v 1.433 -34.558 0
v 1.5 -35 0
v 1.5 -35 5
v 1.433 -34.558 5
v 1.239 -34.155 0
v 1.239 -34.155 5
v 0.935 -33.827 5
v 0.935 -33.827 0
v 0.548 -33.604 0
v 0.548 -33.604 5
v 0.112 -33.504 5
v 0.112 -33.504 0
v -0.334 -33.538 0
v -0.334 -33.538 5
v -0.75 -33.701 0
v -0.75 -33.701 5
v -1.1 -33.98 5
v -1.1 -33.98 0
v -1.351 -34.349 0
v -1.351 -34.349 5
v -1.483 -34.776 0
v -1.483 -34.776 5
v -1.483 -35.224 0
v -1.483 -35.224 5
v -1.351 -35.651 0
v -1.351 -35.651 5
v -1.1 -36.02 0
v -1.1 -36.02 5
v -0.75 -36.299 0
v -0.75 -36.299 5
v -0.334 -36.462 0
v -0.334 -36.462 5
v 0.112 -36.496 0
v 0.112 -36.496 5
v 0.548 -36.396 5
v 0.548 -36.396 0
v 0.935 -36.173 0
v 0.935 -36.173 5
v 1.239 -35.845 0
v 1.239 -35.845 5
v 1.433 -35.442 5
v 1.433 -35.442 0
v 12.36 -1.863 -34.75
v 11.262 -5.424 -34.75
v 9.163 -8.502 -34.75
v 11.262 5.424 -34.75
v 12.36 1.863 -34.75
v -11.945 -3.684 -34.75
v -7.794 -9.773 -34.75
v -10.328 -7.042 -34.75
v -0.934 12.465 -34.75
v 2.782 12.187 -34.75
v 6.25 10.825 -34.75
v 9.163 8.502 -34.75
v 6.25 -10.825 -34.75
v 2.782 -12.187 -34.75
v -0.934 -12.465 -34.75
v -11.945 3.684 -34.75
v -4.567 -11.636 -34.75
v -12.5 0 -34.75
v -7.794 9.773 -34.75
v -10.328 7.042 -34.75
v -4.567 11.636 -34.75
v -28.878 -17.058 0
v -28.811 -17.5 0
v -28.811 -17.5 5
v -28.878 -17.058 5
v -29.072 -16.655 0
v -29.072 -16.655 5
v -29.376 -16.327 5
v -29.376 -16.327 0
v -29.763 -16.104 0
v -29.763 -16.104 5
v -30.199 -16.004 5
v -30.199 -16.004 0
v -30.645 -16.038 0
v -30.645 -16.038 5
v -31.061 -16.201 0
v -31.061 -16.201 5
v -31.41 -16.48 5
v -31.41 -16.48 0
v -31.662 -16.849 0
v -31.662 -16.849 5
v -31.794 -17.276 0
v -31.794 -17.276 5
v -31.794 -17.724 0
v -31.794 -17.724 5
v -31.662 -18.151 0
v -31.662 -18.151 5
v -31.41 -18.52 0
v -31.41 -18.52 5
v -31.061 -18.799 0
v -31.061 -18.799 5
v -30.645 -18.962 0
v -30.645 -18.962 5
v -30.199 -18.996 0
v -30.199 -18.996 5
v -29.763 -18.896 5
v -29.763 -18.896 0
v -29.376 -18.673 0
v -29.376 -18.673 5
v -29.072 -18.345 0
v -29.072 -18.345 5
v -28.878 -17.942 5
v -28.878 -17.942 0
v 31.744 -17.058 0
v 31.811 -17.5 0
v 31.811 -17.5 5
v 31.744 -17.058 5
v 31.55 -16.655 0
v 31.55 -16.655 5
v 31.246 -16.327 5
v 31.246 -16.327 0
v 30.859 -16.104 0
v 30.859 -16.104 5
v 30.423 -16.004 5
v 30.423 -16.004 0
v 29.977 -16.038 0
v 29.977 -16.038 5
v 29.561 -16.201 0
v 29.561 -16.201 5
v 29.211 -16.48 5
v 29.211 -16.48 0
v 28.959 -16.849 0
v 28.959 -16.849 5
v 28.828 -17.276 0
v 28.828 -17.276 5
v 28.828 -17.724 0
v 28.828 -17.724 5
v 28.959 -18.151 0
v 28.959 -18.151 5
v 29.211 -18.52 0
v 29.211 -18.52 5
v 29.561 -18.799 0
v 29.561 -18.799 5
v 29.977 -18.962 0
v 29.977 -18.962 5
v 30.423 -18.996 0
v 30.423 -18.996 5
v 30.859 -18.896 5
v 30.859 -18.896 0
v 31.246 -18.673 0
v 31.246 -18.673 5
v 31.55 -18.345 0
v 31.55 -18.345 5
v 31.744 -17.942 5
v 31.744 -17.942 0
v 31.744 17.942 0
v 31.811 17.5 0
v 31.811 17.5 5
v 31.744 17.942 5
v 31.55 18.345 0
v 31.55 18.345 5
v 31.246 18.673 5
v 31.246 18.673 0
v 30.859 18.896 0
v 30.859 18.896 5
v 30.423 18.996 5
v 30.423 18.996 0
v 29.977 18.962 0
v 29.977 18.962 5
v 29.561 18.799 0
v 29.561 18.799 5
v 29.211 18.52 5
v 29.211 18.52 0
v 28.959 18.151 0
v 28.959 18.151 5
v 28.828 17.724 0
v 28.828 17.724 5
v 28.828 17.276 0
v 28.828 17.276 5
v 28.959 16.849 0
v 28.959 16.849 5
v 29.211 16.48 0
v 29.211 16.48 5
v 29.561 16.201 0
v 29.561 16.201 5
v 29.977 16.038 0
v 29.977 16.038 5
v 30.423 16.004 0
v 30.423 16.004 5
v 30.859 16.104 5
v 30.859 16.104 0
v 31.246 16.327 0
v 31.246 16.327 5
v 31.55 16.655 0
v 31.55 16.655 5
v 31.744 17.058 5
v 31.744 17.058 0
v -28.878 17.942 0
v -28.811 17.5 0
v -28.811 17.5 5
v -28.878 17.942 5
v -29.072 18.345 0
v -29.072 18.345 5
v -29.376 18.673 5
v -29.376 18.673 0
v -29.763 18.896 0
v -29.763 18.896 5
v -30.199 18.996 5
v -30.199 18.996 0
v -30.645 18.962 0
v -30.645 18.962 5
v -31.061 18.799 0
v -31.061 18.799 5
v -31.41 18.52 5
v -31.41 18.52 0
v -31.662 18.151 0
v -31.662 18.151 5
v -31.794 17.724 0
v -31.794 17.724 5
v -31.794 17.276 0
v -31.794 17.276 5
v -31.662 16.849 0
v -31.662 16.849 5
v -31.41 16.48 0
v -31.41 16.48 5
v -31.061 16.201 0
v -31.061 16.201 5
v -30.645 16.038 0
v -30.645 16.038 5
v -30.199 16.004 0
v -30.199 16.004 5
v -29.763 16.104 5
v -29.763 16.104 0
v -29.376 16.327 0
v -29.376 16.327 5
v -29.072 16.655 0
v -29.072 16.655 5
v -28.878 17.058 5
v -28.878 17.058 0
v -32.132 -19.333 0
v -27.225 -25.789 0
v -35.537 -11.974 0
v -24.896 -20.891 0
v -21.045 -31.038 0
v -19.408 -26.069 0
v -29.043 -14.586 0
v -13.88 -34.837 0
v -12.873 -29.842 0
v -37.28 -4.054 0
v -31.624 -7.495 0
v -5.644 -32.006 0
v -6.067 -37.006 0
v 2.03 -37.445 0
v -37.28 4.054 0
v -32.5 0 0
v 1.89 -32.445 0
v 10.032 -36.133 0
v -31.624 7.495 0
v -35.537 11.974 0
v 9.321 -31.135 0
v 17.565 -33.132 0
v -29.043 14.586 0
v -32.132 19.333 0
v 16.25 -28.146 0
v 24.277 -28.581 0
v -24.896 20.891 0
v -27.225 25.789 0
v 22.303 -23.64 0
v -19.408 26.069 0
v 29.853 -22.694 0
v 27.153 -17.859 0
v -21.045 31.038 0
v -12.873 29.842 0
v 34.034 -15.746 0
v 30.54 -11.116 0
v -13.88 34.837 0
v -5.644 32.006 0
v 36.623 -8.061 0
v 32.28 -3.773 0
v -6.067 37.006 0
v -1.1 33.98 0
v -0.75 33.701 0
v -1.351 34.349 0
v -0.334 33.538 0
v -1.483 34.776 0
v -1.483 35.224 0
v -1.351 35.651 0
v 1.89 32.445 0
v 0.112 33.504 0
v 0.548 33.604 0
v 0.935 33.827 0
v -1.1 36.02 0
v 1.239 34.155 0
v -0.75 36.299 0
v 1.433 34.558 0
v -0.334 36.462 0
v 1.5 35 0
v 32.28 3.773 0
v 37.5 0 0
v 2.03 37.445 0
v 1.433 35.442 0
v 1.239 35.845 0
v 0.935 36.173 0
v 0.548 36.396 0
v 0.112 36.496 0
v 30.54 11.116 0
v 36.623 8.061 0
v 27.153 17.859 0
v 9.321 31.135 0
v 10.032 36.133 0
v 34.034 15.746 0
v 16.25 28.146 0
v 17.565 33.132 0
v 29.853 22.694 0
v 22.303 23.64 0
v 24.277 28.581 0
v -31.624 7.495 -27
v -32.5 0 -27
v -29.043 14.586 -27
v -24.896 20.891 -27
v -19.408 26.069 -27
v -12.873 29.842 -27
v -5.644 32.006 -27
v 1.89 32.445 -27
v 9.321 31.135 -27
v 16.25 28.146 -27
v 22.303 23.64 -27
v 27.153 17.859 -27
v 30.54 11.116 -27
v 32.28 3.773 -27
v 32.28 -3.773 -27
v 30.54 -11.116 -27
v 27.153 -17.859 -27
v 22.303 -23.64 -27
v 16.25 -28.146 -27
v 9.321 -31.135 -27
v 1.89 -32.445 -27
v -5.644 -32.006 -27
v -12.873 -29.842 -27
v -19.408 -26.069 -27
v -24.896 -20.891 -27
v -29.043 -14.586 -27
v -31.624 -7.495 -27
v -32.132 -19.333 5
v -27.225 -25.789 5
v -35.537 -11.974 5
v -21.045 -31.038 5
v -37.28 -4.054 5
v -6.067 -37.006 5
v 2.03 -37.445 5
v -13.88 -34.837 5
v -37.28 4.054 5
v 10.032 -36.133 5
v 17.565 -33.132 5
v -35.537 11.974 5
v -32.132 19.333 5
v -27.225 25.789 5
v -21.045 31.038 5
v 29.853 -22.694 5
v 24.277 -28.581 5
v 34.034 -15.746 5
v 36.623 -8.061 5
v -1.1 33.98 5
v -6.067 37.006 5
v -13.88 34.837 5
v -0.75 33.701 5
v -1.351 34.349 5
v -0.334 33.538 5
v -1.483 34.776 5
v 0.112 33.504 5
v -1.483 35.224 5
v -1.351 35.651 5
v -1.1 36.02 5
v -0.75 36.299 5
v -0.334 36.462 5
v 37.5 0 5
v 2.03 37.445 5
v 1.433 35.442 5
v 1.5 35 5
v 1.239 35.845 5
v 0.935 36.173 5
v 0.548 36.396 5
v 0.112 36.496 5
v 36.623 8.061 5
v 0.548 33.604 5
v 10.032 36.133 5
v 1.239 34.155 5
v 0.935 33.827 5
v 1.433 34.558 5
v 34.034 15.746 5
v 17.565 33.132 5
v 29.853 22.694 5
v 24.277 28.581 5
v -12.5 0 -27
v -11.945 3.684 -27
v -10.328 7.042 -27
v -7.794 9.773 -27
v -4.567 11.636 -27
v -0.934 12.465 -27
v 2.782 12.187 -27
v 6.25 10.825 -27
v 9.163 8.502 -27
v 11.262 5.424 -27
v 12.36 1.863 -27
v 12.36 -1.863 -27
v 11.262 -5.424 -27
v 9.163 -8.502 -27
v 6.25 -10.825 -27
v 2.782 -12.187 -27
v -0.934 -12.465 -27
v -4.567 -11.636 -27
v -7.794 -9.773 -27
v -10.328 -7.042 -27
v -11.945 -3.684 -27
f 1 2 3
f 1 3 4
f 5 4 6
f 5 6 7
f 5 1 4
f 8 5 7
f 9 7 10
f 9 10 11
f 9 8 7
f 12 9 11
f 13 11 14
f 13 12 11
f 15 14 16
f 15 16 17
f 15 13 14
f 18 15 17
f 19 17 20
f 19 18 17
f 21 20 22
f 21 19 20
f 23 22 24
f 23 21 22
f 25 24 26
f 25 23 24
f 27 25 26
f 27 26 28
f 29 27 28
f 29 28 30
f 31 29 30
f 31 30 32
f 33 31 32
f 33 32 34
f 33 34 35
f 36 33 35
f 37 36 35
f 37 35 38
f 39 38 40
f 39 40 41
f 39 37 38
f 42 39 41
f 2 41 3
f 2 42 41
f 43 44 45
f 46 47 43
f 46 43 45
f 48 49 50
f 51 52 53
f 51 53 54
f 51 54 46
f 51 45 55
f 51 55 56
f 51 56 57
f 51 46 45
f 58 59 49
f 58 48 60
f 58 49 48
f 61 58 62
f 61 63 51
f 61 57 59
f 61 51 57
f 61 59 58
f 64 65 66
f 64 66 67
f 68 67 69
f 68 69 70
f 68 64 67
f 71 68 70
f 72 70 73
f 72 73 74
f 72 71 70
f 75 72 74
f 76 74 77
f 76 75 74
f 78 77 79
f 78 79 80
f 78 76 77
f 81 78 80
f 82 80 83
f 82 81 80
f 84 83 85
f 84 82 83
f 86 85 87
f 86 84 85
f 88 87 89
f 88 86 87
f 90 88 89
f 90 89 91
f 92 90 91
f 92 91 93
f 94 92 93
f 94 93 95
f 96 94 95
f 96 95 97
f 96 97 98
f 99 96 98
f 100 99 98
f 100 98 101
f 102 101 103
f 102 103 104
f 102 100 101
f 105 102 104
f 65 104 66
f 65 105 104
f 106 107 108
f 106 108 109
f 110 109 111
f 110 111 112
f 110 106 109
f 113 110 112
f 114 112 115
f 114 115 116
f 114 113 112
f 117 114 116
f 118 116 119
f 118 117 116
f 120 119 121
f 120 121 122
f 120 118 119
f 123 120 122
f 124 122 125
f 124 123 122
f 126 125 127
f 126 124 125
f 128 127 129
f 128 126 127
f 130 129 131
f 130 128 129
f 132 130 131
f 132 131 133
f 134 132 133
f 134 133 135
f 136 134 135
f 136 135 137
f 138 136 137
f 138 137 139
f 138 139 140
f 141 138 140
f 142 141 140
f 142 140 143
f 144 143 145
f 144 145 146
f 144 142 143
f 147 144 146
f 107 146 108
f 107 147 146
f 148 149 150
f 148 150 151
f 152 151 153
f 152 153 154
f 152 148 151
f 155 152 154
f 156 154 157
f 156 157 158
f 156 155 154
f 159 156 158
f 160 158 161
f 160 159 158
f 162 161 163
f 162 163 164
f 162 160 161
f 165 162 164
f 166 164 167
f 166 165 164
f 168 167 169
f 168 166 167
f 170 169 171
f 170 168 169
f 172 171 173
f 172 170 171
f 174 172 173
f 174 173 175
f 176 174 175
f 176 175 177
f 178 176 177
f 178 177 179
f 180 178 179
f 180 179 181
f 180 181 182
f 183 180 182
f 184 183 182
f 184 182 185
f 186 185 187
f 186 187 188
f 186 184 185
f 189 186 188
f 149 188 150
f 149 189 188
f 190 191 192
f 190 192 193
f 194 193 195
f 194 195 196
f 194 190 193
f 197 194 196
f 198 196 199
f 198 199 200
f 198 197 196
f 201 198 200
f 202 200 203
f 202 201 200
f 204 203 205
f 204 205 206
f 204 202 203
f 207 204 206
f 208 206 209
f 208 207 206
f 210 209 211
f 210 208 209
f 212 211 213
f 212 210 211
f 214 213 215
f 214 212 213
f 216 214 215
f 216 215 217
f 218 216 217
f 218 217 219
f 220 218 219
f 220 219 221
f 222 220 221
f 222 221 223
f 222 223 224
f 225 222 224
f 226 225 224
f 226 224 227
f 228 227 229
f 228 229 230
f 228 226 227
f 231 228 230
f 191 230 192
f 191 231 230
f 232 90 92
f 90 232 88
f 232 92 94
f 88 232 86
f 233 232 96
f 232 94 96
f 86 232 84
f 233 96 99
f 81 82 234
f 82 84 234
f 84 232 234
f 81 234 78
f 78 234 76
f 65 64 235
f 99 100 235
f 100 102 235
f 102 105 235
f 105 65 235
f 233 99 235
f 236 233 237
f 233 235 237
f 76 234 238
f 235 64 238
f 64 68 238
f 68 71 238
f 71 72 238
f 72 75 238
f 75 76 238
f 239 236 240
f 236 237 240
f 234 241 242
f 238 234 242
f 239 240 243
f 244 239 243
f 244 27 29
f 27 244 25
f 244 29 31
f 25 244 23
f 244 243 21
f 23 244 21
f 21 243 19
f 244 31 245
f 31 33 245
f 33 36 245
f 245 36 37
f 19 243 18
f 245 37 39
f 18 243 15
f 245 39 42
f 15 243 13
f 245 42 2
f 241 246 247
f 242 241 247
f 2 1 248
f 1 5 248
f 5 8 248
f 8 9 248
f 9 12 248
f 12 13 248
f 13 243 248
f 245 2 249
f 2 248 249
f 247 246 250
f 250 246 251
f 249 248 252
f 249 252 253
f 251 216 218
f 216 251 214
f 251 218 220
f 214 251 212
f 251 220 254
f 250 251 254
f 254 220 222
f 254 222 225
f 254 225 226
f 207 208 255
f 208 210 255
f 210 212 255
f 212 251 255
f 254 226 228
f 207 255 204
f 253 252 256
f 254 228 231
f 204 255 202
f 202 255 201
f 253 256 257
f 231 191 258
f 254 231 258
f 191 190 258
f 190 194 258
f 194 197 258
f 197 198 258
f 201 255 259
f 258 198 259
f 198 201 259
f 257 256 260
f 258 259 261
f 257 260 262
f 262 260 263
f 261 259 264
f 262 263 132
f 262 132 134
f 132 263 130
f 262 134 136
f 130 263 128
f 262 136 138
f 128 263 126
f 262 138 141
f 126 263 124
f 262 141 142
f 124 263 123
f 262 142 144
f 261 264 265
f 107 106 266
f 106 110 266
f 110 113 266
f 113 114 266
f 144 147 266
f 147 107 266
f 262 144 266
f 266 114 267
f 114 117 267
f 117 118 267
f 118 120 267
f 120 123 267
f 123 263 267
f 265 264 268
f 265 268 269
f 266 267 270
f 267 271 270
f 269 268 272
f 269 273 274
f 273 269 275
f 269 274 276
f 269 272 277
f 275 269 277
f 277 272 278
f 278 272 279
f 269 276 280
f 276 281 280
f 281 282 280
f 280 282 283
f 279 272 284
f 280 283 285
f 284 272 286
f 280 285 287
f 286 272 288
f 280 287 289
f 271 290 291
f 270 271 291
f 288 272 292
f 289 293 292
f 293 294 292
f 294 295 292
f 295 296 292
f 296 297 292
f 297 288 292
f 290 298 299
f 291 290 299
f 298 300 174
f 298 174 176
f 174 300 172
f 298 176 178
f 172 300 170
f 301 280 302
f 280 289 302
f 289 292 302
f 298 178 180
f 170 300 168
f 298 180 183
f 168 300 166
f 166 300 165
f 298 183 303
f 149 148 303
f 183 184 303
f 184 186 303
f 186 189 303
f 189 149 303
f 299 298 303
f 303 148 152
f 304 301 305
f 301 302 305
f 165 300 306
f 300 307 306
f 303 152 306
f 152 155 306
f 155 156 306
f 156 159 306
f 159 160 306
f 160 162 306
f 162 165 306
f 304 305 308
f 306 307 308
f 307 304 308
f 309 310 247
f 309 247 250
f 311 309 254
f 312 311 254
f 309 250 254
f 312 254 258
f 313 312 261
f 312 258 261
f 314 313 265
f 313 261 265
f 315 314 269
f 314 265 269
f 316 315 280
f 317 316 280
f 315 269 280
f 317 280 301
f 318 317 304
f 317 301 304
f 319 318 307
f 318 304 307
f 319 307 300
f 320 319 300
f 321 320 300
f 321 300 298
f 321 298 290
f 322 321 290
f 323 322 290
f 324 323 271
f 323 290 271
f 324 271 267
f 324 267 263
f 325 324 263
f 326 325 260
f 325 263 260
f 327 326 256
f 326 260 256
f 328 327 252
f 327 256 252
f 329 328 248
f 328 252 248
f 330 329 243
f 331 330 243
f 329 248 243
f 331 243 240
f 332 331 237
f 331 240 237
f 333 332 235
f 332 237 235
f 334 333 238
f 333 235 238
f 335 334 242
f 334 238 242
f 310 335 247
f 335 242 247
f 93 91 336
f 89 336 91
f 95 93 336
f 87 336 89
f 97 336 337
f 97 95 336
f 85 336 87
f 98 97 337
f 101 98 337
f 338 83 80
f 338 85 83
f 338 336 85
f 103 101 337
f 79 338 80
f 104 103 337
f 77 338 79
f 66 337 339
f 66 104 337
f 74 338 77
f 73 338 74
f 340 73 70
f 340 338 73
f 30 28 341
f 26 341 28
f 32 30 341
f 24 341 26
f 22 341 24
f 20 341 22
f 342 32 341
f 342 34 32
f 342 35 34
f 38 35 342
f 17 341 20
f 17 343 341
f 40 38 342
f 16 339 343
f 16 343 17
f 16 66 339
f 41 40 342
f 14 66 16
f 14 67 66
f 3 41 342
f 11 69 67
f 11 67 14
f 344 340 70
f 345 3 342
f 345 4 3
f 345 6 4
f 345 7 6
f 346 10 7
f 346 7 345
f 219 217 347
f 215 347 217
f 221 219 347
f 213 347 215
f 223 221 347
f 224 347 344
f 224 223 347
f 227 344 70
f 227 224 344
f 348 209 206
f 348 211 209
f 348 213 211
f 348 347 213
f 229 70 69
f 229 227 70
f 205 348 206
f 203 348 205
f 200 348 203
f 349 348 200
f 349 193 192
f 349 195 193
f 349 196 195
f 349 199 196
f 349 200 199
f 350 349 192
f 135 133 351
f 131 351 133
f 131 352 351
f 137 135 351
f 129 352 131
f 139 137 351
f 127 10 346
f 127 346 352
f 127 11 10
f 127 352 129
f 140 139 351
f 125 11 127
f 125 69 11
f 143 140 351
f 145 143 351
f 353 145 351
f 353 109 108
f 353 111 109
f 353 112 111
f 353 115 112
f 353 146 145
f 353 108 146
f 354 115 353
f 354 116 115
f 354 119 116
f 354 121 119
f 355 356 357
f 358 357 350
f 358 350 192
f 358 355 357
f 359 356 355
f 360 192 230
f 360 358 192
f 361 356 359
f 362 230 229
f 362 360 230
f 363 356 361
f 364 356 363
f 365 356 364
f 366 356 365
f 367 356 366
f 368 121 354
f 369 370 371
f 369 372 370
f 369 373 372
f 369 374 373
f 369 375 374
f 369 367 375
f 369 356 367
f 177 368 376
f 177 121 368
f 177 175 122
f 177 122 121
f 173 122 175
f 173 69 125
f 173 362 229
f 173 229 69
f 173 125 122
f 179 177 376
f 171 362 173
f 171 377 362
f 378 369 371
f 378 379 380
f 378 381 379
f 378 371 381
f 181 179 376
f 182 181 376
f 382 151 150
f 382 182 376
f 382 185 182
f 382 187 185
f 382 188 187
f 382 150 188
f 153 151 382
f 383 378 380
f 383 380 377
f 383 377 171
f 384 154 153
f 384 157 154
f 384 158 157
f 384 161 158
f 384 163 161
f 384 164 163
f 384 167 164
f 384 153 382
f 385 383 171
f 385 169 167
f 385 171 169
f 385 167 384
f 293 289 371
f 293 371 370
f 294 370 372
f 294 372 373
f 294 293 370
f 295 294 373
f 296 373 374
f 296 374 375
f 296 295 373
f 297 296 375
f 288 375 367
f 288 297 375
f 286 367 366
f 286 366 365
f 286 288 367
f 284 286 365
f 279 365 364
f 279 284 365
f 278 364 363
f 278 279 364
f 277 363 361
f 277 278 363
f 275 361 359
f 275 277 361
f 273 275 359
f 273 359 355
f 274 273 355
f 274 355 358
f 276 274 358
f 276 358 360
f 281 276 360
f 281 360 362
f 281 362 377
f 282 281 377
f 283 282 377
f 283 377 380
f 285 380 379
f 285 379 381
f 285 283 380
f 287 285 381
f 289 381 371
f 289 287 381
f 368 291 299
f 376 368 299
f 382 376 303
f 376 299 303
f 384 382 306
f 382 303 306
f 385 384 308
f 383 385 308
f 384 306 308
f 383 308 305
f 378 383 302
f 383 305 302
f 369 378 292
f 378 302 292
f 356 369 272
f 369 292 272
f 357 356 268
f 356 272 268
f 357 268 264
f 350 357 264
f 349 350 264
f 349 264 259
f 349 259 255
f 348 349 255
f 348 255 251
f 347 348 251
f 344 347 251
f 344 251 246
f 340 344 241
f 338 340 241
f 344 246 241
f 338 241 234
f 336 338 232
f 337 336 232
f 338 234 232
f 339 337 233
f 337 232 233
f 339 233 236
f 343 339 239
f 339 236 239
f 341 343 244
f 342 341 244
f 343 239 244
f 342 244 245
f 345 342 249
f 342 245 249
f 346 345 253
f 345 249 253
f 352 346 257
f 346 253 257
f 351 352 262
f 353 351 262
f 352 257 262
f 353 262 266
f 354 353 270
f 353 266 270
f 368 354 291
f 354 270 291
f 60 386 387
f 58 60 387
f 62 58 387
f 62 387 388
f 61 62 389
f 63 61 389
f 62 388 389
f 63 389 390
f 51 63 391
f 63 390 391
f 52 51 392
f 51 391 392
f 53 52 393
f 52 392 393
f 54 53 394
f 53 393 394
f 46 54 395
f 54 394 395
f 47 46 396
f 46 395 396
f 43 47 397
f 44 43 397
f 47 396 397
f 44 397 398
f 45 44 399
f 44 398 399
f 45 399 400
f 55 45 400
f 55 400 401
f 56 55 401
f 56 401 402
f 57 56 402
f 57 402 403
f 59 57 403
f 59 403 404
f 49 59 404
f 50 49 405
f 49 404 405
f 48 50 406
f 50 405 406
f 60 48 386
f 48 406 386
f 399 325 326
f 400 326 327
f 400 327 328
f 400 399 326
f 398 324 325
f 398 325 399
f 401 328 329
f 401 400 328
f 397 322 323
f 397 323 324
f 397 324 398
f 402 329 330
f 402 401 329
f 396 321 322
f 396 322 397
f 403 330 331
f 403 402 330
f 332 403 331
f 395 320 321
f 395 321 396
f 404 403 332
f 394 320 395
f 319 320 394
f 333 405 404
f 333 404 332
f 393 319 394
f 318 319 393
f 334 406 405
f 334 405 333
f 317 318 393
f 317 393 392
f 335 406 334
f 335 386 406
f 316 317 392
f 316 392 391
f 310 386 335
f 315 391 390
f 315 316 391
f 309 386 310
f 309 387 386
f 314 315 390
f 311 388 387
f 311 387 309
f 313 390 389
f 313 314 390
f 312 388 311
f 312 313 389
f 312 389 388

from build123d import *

# Parameters (mm, degrees)
SKETCH1_R           = 37.5
SKETCH1_R_2         = 1.5
BOSS_EXTRUDE1_DEPTH = 5
SKETCH2_R           = 32.5
BOSS_EXTRUDE2_DEPTH = 27
SKETCH3_R           = 12.5
BOSS_EXTRUDE3_DEPTH = 7.75


with BuildPart() as part:
    # Sketch1 → Boss-Extrude1 (new body)
    with BuildSketch(Plane.XY):
        Circle(SKETCH1_R)
        with Locations((0, 35)):
            Circle(SKETCH1_R_2, mode=Mode.SUBTRACT)
        with Locations((30.310889132, 17.5)):
            Circle(SKETCH1_R_2, mode=Mode.SUBTRACT)
        with Locations((30.310889132, -17.5)):
            Circle(SKETCH1_R_2, mode=Mode.SUBTRACT)
        with Locations((0, -35)):
            Circle(SKETCH1_R_2, mode=Mode.SUBTRACT)
        with Locations((-30.310889132, -17.5)):
            Circle(SKETCH1_R_2, mode=Mode.SUBTRACT)
        with Locations((-30.310889132, 17.5)):
            Circle(SKETCH1_R_2, mode=Mode.SUBTRACT)
    extrude(amount=BOSS_EXTRUDE1_DEPTH)

    # Sketch2 → Boss-Extrude2 (add)
    with BuildSketch(Plane(origin=(0, 0, 0), x_dir=(-1, 0, 0), z_dir=(0, 0, -1))):
        Circle(SKETCH2_R)
    extrude(amount=BOSS_EXTRUDE2_DEPTH)

    # Sketch3 → Boss-Extrude3 (add)
    with BuildSketch(Plane(origin=(0, 0, -27), x_dir=(-1, 0, 0), z_dir=(0, 0, -1))):
        Circle(SKETCH3_R)
    extrude(amount=BOSS_EXTRUDE3_DEPTH)


solid = part.part
